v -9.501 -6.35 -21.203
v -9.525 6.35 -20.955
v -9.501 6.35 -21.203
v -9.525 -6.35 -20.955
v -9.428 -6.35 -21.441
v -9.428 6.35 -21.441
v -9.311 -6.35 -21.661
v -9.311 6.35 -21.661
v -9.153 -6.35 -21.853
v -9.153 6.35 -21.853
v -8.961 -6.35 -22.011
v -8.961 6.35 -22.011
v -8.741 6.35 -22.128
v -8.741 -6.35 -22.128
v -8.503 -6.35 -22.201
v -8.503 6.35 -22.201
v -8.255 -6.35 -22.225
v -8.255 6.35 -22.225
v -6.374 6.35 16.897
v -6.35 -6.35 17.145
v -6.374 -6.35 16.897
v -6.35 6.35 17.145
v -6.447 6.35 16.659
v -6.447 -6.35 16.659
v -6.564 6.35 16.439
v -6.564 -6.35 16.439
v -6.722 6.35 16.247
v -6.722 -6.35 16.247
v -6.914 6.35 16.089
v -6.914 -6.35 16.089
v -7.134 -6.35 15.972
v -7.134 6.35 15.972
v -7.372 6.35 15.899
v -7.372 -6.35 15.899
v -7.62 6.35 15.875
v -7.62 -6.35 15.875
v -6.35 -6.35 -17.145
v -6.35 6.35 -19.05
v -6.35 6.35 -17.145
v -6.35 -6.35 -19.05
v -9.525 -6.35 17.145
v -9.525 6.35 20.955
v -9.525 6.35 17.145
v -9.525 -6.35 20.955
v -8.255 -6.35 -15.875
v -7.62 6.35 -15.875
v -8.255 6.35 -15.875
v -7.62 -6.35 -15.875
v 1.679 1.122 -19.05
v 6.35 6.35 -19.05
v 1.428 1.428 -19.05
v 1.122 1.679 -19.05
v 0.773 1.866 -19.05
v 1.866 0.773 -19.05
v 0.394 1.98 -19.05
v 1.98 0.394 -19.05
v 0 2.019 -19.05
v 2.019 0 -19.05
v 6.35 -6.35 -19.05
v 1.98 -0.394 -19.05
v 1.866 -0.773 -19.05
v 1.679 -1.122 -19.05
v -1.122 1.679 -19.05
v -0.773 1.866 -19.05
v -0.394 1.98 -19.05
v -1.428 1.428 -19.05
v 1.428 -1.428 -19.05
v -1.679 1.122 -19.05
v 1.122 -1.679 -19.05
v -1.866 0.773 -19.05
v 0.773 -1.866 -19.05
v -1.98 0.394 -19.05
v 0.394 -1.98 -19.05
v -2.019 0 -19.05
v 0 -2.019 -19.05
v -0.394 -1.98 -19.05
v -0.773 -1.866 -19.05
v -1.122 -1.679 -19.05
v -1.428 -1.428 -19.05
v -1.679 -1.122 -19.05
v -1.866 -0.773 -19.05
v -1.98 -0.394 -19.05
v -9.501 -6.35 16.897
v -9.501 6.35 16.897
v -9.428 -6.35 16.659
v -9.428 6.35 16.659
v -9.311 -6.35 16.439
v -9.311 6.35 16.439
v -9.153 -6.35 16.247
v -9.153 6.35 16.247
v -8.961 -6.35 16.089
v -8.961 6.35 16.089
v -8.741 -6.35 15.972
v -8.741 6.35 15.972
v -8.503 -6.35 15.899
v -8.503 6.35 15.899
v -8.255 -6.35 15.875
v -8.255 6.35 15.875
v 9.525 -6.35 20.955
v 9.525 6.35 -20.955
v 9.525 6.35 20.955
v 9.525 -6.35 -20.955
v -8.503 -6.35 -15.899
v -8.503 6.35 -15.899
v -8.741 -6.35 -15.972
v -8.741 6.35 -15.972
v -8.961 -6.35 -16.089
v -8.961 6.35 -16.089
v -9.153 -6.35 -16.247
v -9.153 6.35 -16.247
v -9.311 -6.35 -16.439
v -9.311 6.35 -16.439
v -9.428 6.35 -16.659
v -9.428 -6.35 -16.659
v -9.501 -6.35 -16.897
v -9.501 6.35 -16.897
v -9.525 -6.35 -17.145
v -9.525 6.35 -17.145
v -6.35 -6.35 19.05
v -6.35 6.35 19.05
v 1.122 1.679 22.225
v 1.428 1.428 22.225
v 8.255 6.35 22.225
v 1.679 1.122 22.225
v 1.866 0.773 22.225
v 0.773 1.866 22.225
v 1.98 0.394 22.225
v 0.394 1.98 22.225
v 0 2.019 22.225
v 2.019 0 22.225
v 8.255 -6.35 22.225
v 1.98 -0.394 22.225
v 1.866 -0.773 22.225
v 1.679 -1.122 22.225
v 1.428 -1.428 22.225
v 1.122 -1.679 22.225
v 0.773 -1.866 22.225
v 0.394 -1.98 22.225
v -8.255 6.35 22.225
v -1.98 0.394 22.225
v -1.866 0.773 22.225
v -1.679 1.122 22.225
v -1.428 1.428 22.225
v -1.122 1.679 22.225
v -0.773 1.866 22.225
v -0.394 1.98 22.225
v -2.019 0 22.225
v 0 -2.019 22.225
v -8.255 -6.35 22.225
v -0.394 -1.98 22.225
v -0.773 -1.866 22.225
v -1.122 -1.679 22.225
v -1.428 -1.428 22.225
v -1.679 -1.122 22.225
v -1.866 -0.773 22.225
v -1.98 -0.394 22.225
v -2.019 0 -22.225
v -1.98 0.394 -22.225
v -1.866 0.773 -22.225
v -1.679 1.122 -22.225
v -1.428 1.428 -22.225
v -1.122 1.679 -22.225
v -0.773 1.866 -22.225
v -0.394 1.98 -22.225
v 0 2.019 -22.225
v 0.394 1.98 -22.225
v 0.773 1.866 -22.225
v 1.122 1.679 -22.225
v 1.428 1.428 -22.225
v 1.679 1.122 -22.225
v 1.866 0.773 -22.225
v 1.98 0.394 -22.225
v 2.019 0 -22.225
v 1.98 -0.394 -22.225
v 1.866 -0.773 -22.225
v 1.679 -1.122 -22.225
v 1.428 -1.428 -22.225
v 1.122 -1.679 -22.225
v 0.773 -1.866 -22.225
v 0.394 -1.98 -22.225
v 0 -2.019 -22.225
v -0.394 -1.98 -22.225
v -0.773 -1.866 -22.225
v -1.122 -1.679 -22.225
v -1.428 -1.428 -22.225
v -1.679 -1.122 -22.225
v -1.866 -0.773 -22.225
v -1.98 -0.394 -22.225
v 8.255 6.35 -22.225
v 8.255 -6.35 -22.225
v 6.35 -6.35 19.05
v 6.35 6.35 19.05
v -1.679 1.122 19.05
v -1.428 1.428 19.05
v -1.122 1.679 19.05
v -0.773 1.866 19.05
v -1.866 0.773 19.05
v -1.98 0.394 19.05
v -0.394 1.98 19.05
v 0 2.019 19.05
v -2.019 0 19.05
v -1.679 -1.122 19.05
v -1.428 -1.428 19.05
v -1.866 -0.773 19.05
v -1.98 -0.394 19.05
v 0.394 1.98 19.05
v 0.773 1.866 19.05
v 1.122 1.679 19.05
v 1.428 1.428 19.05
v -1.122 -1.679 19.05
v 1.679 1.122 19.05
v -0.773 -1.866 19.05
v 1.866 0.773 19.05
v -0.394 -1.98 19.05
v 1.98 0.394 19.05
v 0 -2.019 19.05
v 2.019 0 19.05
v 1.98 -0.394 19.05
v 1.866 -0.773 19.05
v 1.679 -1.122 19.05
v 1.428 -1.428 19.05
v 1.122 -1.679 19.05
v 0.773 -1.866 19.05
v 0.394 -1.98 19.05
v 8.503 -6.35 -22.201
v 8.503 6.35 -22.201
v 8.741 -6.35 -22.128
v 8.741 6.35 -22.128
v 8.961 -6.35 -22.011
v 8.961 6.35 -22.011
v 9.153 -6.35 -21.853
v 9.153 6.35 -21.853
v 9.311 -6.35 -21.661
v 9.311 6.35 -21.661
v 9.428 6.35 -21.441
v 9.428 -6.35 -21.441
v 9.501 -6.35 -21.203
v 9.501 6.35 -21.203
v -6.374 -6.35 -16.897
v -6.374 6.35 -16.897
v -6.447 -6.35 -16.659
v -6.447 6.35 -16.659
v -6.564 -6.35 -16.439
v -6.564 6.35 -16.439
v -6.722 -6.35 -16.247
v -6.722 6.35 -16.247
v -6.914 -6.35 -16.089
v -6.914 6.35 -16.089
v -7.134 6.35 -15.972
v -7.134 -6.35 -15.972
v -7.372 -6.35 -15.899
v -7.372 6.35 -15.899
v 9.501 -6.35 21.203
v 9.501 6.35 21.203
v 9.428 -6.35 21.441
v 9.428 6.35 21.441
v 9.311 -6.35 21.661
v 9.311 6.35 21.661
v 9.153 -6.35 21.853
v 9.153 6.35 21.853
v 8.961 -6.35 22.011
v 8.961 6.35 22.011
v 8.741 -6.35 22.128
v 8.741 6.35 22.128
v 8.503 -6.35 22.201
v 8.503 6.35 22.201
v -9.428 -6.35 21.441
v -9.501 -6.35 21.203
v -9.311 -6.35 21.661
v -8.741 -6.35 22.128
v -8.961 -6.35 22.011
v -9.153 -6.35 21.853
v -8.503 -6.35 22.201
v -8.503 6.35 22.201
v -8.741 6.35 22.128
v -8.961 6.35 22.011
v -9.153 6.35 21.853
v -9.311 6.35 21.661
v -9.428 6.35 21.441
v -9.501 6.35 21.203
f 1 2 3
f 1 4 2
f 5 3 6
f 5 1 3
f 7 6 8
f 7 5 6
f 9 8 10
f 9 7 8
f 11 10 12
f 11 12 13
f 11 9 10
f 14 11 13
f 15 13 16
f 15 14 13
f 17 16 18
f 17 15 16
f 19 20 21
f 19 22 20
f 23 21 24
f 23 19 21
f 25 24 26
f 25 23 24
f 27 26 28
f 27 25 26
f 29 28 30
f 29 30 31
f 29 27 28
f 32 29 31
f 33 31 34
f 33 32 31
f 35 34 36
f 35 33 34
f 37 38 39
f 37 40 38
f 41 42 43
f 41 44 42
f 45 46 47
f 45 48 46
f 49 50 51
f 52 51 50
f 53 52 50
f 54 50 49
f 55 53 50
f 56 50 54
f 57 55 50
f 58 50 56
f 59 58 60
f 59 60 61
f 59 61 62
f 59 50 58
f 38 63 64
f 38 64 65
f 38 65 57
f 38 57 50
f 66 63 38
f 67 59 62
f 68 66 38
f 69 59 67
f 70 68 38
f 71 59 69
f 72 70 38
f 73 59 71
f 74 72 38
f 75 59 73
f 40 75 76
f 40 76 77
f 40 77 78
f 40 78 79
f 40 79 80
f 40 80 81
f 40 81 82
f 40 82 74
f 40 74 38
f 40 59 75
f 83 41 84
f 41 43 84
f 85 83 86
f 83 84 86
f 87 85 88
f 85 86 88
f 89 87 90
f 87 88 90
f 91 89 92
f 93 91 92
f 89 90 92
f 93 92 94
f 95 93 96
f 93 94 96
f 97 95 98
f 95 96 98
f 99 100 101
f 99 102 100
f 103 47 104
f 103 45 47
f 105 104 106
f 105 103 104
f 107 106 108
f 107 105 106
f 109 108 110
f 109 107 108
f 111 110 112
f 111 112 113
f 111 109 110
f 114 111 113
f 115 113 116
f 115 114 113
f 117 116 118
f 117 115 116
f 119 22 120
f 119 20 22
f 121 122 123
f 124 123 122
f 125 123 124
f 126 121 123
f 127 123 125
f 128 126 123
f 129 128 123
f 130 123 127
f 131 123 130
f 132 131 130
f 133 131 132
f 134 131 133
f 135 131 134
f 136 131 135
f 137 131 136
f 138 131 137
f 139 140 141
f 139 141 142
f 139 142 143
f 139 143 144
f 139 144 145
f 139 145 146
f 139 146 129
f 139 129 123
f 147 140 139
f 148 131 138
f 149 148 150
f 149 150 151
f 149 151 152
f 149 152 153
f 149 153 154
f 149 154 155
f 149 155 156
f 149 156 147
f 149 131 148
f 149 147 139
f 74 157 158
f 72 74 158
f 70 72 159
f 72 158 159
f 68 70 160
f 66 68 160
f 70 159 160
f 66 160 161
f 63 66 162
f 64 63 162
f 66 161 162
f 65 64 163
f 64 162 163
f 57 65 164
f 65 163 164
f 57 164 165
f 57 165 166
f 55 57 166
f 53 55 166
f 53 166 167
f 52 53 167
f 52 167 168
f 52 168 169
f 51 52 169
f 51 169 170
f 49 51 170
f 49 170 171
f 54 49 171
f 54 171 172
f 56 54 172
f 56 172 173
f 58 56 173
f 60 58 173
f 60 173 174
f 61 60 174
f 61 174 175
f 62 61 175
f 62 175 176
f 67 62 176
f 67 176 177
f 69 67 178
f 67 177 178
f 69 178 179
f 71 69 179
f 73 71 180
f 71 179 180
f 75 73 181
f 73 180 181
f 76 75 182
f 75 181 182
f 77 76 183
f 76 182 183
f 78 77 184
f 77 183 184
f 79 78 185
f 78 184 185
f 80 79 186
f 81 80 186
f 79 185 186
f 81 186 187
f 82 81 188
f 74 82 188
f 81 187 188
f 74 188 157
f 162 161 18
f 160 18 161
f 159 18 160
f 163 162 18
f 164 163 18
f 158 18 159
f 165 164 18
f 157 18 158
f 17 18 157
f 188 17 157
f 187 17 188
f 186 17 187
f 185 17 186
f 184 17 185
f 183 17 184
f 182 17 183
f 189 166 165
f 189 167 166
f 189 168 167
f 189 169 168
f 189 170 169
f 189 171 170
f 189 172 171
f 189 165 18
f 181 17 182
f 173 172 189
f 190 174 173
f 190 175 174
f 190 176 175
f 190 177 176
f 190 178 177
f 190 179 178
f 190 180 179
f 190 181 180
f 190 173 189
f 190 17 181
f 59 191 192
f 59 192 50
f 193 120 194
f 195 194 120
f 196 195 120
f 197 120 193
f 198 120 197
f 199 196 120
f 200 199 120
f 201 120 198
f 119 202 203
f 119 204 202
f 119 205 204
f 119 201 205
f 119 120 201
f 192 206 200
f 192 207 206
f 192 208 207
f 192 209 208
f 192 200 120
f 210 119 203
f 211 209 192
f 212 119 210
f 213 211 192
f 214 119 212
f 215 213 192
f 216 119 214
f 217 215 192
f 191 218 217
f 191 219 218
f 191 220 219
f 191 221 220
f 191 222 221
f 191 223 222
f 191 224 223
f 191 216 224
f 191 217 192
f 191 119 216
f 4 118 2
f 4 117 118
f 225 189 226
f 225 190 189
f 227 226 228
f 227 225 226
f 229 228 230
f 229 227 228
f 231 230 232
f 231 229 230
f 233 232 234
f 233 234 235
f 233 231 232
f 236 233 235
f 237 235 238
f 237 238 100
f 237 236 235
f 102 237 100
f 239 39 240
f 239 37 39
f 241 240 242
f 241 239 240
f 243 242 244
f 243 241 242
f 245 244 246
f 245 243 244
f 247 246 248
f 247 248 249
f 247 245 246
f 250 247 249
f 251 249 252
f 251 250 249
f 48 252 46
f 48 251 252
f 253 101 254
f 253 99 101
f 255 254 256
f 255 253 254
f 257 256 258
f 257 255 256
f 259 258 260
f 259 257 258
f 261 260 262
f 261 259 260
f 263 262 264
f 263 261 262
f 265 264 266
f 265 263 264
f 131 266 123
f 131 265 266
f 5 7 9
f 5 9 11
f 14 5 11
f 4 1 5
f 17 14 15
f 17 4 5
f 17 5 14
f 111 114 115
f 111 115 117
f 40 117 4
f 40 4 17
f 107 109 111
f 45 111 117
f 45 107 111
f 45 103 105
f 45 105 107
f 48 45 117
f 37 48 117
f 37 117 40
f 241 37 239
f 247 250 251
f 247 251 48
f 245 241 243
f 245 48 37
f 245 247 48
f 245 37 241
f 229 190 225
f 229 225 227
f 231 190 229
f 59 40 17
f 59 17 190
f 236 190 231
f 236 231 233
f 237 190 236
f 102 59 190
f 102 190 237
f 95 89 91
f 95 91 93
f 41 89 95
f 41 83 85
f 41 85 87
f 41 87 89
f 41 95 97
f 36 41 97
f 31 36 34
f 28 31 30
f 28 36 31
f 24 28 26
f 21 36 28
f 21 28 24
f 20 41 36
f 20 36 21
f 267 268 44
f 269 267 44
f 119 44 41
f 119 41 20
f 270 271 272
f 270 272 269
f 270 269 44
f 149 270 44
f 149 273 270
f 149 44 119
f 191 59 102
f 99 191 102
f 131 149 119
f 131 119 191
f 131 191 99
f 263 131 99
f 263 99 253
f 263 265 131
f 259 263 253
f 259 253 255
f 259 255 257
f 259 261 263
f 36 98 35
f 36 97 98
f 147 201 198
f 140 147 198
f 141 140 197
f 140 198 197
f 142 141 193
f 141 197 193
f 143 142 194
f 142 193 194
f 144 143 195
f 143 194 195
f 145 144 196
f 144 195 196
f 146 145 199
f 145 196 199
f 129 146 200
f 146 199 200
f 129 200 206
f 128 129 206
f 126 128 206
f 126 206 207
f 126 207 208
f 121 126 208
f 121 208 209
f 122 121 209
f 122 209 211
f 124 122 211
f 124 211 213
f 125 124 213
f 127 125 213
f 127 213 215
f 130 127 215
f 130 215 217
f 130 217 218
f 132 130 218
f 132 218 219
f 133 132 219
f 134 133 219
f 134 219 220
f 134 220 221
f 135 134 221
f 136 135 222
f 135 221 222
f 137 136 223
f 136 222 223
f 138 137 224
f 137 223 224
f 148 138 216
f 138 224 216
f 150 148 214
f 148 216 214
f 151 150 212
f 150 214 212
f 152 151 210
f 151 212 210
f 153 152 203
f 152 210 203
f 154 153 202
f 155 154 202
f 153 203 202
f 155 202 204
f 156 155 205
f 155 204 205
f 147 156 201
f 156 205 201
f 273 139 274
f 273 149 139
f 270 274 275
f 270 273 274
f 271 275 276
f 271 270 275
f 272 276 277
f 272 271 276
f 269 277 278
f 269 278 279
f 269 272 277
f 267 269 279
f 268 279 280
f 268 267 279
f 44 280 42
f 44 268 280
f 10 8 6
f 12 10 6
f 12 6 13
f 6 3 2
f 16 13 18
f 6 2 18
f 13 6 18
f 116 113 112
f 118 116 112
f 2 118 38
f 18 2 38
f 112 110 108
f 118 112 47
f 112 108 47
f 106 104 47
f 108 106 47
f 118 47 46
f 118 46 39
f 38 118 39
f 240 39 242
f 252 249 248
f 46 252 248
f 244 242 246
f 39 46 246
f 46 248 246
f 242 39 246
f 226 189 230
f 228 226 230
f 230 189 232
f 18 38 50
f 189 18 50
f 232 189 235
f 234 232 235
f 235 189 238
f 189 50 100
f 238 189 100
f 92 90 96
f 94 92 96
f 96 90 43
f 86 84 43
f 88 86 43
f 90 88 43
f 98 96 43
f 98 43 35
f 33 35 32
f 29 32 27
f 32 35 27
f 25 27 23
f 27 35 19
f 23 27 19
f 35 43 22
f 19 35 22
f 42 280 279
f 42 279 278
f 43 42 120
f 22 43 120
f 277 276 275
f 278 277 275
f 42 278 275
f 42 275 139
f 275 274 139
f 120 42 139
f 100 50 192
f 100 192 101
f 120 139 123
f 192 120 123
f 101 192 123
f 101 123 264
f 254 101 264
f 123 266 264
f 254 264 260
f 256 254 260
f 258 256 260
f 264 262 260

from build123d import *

# Parameters (mm, degrees)
F1_DEPTH      = 6.35
F1_DEPTH_BACK = 6.35
F3_D          = 4.0386
F4_R          = 1.27


with BuildPart() as f1:
    # F0 (on Front) → F1 (new body, two sides)
    with BuildSketch(Plane.XZ) as f1_sk:
        Polygon((-6.35, 19.05), (6.35, 19.05), (6.35, -19.05), (-6.35, -19.05), (-6.35, -15.875), (-9.525, -15.875), (-9.525, -22.225), (9.525, -22.225), (9.525, 22.225), (-9.525, 22.225), (-9.525, 15.875), (-6.35, 15.875), align=None)
    extrude(amount=F1_DEPTH)
    extrude(f1_sk.sketch, amount=-F1_DEPTH_BACK)

    # F3 (through all)
    with Locations(Plane.XY.offset(22.225)):
        with Locations((0, 0)):
            Hole(F3_D / 2)

    # F4
    f4_edges = [f1.edges().sort_by_distance(p)[0] for p in [
        (-9.525, 0, 22.225),
        (-9.525, 0, 15.875),
        (-6.35, 0, 15.875),
        (9.525, 0, 22.225),
        (9.525, 0, -22.225),
        (-9.525, 0, -22.225),
        (-9.525, 0, -15.875),
        (-6.35, 0, -15.875),
    ]]
    fillet(f4_edges, radius=F4_R)


solid = f1.part
